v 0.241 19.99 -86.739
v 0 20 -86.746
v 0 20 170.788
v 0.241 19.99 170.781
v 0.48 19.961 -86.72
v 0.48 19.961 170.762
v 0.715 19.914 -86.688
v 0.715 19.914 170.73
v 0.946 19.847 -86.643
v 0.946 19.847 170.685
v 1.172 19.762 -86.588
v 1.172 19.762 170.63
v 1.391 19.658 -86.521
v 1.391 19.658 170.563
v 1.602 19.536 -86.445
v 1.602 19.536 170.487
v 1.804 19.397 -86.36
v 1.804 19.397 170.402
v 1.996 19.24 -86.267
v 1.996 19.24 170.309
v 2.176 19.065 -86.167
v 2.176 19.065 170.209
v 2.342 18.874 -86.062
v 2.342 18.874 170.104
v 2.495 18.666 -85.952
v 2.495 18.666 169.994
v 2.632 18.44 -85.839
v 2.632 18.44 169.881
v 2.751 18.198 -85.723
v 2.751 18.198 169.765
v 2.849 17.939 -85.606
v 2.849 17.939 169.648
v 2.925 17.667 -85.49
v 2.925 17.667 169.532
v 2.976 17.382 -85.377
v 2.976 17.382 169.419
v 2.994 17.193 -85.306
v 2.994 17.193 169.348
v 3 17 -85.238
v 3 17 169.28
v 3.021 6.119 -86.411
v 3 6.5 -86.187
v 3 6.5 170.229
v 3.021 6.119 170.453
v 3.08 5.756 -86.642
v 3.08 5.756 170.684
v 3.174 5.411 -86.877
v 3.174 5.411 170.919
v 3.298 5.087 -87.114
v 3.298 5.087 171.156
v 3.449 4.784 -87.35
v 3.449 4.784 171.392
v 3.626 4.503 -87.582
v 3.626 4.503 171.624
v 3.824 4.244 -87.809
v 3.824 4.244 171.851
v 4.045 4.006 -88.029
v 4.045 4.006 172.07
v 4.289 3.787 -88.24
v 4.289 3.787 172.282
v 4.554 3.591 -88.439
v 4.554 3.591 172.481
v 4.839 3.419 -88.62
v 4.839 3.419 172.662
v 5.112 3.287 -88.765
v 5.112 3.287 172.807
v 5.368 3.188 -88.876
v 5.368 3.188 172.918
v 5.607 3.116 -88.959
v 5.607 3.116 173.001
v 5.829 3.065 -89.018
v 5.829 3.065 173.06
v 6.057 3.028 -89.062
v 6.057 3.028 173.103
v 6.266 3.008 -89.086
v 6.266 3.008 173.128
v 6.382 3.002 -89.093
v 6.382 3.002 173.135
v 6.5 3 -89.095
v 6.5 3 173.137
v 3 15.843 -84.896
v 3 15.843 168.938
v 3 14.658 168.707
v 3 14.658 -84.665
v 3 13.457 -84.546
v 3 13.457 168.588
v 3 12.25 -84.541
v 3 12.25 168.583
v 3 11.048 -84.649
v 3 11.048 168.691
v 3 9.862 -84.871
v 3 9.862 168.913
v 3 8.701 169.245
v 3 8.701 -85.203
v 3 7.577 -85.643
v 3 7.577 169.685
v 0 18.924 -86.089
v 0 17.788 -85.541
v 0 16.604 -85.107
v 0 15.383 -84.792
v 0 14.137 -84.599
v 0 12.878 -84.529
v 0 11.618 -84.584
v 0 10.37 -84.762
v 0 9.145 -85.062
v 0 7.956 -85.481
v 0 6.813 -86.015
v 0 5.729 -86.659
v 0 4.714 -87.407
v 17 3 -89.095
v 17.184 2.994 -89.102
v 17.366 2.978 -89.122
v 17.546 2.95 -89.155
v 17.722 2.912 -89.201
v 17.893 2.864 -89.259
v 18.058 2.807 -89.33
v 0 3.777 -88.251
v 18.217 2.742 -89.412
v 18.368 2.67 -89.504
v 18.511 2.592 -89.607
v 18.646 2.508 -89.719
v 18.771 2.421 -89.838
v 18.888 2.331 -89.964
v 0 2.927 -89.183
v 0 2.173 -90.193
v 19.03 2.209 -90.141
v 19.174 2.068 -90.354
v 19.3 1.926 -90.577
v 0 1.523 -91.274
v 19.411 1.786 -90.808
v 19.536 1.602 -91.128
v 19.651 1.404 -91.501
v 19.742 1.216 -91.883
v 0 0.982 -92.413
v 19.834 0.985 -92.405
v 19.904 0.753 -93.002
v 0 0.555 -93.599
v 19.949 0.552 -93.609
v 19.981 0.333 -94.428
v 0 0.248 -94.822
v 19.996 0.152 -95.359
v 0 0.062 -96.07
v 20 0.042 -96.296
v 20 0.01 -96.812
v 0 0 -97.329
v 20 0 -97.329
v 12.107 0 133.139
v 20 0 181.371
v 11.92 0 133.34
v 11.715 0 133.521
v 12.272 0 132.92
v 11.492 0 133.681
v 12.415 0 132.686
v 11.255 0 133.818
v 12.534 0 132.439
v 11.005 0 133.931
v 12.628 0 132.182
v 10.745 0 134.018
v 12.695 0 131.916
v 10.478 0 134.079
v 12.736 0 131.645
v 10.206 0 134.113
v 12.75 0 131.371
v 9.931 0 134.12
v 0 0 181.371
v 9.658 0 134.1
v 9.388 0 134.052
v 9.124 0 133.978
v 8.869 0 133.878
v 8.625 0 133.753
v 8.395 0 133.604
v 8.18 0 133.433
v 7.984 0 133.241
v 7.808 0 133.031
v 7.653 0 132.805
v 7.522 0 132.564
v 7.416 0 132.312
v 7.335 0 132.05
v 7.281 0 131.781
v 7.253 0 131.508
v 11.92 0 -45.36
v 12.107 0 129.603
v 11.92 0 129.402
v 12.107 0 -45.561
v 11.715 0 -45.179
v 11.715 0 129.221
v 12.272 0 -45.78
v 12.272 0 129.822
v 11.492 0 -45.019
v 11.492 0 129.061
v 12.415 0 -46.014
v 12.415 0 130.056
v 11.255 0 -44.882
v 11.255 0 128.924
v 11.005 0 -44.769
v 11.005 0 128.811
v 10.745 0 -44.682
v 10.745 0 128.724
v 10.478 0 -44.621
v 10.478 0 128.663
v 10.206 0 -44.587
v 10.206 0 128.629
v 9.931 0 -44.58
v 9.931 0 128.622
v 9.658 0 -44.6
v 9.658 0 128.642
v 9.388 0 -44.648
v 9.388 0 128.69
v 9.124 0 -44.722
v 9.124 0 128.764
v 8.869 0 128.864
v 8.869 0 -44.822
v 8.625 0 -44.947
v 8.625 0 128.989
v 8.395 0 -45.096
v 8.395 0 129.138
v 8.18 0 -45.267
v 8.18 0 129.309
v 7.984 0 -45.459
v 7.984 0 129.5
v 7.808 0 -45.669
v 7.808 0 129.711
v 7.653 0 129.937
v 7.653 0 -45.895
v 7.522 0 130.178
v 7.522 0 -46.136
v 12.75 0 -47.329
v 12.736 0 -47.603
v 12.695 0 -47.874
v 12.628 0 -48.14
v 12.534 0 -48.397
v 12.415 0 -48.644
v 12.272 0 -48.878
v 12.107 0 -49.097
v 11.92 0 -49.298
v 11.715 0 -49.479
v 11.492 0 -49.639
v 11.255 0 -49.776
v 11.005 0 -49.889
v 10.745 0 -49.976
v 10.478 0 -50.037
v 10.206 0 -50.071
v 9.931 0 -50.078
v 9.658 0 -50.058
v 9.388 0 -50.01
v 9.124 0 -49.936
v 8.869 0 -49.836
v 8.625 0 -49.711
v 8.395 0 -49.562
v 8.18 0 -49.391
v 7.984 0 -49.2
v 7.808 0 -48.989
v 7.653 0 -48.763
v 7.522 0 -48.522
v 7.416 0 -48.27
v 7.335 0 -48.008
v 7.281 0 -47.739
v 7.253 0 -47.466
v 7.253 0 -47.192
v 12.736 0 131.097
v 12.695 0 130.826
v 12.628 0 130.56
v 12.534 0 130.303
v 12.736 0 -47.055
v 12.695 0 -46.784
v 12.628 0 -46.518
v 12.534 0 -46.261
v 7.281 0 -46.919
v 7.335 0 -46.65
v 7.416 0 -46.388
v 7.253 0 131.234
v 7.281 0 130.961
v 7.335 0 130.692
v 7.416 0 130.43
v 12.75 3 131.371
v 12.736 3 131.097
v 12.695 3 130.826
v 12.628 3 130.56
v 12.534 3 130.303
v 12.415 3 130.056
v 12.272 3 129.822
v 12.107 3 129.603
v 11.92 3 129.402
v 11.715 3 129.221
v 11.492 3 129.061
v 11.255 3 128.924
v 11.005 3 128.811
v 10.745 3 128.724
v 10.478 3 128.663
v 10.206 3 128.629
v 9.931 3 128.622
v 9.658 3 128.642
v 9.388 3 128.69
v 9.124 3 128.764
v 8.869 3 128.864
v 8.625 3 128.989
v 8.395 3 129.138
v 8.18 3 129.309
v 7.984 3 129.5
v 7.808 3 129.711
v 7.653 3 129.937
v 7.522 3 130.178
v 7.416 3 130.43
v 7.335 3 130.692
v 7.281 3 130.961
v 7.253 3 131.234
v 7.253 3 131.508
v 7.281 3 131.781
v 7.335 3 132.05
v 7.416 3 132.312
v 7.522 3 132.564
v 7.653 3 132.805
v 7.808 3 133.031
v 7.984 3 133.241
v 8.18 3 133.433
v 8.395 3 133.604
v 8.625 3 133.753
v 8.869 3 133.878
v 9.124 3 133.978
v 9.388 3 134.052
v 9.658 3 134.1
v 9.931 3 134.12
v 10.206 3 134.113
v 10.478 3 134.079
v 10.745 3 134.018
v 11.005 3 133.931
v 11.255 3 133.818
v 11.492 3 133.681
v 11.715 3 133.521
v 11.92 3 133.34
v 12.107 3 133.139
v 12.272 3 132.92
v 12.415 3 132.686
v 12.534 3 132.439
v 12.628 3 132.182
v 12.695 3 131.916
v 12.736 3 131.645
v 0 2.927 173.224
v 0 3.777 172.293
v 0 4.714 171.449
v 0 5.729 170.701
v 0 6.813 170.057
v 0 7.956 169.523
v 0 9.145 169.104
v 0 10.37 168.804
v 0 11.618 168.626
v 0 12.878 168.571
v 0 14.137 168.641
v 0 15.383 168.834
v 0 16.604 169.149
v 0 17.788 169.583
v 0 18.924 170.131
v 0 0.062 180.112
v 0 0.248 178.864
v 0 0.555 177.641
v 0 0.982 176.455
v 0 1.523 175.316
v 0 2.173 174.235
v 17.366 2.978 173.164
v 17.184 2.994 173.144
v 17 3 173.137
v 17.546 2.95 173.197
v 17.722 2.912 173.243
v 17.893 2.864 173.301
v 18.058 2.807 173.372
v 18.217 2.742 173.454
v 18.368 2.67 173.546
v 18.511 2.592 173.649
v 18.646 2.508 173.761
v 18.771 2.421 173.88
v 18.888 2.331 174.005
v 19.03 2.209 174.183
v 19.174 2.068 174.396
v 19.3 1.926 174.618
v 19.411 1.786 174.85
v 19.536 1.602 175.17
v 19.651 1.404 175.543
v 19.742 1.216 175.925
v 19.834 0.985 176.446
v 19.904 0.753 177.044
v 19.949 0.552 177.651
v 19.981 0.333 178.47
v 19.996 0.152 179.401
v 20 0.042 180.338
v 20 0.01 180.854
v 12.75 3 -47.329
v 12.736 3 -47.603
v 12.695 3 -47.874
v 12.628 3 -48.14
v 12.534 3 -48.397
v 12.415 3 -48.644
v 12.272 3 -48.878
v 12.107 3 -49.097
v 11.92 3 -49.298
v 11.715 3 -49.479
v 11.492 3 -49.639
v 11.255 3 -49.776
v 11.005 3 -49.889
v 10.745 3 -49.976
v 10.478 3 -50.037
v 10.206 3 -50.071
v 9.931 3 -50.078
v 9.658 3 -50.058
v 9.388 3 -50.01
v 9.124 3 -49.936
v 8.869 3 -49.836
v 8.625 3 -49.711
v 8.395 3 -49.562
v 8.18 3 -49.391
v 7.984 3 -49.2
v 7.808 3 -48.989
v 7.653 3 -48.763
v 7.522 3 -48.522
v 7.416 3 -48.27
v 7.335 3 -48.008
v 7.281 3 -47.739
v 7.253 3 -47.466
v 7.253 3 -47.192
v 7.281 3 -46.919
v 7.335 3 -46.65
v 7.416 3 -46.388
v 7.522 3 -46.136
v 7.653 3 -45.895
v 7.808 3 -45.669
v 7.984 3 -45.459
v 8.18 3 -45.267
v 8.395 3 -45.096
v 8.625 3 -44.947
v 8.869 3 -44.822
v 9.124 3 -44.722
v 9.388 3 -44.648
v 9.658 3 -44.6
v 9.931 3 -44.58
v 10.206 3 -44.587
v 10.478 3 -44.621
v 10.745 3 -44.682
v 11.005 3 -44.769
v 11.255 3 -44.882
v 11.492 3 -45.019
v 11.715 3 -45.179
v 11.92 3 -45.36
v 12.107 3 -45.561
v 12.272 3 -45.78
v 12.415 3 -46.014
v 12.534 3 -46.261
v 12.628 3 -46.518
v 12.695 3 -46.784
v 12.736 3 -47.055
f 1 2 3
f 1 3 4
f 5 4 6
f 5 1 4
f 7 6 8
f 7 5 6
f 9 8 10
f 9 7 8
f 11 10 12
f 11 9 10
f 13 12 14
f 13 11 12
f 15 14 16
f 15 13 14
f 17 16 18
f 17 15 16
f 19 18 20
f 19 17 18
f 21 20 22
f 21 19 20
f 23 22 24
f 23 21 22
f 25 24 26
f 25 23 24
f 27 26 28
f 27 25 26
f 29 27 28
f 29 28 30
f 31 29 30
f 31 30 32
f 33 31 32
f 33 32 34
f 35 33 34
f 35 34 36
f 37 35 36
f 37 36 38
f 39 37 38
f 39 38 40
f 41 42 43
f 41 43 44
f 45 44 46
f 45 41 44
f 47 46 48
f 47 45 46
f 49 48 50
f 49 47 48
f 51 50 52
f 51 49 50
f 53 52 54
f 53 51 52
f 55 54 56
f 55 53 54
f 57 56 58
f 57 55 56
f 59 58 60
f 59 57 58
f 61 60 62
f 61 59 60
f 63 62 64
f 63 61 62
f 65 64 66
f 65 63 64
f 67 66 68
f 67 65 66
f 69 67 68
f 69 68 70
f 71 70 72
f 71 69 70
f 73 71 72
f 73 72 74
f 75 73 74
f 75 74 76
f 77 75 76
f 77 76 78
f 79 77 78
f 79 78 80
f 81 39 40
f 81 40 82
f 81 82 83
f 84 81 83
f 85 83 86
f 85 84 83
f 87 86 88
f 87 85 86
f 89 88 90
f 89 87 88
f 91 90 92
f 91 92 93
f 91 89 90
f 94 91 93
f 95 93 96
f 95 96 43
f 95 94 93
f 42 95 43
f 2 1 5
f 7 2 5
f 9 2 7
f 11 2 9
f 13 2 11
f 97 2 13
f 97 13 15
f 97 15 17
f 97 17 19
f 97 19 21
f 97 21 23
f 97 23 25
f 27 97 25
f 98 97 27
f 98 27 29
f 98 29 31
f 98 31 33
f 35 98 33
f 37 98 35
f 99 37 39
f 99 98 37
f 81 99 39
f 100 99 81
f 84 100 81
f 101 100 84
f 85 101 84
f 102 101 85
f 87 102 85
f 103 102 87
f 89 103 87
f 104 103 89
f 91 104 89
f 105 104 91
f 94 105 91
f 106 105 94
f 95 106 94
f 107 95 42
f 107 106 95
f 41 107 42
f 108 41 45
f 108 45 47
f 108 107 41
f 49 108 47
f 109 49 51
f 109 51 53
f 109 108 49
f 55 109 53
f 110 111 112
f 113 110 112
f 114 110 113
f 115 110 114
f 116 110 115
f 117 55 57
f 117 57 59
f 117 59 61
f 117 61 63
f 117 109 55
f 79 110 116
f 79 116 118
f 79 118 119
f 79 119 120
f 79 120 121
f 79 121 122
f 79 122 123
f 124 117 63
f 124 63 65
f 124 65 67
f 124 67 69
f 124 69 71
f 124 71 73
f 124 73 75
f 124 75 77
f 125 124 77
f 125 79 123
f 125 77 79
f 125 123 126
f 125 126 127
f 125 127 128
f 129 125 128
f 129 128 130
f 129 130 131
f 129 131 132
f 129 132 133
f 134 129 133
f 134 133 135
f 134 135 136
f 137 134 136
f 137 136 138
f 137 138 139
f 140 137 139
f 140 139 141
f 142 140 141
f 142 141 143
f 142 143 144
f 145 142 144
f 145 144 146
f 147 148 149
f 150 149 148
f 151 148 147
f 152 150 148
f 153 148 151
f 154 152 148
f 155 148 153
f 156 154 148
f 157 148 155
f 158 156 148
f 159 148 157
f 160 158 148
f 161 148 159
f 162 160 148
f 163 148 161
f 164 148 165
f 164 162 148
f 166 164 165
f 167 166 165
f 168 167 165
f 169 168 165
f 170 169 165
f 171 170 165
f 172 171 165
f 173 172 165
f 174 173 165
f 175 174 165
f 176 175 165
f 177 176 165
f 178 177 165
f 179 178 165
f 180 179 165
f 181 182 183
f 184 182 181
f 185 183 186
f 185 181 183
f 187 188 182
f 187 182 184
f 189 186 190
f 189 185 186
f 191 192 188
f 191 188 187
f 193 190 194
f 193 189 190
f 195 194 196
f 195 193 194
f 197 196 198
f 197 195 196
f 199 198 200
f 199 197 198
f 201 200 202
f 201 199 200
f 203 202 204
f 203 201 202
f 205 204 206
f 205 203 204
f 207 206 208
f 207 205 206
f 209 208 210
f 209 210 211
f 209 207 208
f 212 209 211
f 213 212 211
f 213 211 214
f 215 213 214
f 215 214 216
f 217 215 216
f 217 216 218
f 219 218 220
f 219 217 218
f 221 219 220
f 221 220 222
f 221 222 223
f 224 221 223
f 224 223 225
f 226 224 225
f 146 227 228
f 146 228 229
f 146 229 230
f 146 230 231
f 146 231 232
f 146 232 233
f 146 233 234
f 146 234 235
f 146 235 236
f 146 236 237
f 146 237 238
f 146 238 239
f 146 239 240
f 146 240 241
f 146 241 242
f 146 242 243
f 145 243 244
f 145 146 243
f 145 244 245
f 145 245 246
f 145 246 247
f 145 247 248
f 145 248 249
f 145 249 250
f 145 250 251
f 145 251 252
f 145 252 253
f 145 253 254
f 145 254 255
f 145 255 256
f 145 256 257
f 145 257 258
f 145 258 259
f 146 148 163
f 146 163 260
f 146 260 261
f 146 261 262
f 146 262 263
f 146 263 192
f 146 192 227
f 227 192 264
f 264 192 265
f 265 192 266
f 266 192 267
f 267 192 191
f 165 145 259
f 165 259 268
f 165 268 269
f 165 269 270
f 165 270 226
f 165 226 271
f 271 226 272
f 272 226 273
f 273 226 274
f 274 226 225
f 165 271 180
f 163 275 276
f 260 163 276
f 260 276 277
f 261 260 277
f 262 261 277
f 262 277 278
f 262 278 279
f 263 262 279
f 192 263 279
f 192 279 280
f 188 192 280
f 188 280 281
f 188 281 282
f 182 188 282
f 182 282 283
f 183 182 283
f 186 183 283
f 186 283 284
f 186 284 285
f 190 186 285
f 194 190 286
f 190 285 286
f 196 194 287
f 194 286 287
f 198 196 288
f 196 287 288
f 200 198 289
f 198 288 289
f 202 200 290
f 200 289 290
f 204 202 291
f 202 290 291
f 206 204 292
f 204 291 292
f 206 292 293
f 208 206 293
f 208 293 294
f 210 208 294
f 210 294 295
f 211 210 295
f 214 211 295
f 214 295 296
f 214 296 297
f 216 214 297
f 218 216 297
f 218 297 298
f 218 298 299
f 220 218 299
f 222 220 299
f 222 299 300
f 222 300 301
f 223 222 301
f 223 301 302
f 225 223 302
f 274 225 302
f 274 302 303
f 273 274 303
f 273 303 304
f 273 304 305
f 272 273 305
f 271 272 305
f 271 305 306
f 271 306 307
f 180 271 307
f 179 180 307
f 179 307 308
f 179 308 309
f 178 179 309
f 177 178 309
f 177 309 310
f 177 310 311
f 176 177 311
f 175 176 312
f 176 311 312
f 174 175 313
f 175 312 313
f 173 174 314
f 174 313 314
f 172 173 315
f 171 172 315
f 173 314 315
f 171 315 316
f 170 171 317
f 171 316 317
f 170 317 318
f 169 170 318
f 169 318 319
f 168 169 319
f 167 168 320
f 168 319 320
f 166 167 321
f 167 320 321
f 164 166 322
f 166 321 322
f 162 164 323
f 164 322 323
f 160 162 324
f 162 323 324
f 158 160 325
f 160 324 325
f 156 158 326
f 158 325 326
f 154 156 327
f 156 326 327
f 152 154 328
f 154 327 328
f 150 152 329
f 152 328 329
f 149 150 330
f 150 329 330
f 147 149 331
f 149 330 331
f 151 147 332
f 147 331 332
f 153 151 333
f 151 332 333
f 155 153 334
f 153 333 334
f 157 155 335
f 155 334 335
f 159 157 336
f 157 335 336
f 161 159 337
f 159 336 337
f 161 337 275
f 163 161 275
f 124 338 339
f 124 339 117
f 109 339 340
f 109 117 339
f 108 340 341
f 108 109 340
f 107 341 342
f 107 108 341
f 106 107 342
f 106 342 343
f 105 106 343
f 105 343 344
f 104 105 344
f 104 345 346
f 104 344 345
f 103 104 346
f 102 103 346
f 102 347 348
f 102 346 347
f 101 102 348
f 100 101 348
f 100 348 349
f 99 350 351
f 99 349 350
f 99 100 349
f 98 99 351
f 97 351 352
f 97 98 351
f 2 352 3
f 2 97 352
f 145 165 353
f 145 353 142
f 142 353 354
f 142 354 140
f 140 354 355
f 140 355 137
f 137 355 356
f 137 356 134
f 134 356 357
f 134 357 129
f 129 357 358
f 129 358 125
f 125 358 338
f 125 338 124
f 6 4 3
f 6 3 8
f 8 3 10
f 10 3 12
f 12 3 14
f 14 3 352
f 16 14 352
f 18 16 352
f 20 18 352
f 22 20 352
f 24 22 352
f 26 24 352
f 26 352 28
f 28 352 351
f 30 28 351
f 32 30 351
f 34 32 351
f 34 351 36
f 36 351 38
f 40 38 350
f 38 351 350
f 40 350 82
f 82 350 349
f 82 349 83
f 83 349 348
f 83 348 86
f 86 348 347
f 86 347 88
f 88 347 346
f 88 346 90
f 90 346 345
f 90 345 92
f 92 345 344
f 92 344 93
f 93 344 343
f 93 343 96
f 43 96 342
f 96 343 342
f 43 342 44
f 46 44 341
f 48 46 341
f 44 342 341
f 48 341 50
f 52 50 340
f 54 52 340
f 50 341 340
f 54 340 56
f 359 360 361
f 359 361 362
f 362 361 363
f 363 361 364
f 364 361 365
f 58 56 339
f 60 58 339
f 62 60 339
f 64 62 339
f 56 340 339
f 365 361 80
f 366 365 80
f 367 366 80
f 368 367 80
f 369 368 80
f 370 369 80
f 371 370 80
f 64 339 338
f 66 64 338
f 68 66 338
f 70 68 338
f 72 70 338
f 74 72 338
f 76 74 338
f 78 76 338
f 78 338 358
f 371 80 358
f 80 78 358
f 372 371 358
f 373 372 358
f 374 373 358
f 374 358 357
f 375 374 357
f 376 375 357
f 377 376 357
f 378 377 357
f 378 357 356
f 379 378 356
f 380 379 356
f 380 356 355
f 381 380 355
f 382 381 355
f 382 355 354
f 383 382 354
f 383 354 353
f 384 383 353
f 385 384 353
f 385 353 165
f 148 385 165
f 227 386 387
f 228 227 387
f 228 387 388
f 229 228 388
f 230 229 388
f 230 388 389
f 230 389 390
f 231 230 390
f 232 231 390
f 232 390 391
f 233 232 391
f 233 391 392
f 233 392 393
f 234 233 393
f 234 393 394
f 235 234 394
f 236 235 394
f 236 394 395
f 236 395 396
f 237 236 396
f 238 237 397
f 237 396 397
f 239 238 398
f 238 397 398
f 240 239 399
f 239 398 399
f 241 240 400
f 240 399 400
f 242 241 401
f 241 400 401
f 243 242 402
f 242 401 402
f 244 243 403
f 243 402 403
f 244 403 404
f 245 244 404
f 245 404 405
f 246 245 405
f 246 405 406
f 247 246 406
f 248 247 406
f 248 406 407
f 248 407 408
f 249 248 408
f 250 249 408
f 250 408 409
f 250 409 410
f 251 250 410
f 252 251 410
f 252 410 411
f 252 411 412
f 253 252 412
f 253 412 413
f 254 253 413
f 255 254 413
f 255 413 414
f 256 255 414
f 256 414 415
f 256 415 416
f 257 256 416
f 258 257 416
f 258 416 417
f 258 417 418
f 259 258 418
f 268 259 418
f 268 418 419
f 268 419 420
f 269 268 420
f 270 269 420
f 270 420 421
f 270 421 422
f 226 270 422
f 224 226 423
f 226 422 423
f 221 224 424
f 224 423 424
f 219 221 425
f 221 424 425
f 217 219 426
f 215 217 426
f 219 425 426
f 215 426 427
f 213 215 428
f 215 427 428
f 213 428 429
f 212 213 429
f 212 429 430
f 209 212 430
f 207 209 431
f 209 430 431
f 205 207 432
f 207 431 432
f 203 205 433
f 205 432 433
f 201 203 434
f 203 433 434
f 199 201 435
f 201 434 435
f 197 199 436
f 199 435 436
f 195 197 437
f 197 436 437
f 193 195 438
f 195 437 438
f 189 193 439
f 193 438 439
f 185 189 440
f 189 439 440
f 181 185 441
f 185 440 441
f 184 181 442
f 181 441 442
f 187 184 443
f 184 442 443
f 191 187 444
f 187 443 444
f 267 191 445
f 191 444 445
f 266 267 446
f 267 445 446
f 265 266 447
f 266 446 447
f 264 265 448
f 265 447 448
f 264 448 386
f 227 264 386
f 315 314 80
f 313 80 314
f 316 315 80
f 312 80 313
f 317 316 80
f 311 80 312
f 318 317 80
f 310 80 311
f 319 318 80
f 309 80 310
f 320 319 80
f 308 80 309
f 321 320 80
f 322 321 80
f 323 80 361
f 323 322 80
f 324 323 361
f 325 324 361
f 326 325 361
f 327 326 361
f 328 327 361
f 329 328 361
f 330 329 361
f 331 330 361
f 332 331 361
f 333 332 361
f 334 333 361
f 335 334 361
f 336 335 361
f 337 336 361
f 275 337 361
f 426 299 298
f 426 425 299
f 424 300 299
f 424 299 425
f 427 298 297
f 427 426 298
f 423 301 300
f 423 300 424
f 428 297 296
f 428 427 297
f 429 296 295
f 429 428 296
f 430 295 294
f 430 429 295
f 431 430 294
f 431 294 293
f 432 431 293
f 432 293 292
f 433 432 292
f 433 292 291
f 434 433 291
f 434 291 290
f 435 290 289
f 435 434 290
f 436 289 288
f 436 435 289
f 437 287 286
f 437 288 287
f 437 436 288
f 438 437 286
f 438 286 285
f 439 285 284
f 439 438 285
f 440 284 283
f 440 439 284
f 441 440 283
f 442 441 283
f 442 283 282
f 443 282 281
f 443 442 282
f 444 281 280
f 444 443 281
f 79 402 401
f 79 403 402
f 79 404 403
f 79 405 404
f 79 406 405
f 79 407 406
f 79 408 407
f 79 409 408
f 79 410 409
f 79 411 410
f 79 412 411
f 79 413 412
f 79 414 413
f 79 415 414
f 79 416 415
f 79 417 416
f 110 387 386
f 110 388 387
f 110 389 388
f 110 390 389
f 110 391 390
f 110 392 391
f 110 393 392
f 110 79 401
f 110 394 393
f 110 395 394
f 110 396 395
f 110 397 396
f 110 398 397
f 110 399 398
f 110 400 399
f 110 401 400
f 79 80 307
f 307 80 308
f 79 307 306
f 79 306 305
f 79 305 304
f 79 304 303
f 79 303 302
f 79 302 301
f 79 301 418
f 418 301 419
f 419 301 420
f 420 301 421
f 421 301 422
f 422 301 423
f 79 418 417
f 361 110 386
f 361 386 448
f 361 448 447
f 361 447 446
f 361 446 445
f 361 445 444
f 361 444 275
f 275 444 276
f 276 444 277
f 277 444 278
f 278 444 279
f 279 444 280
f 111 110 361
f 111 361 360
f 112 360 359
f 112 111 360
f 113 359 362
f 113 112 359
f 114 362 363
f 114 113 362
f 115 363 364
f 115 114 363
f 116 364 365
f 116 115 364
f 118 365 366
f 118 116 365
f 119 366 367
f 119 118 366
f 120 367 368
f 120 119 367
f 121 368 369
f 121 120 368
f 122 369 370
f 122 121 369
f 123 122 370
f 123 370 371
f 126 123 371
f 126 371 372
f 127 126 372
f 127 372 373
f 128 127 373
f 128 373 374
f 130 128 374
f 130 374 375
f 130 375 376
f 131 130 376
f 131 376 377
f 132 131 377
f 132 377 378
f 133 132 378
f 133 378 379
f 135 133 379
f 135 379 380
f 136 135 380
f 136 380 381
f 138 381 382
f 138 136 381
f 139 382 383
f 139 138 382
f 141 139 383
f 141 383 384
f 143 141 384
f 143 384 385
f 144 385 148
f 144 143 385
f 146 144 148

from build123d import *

# Parameters (mm, degrees)
MIEMBRO_ESTRUCTURAL1_DEPTH   = 278.7
CORTAR_EXTRUIR2_DEPTH        = 184.563144285
TALADRO_DE_MARGEN_PARA_M51_D = 5.5


with BuildPart() as part:
    # Sketch1 → Miembro estructural1 (new body)
    with BuildSketch(Plane.XY.offset(-97.329032258)):
        with BuildLine():
            Line((0, 0), (0, 20))
            ThreePointArc((0, 20), (2.121320344, 19.121320344), (3, 17))
            Line((3, 17), (3, 6.5))
            ThreePointArc((3, 6.5), (4.025126266, 4.025126266), (6.5, 3))
            Line((6.5, 3), (17, 3))
            ThreePointArc((17, 3), (19.121320344, 2.121320344), (20, 0))
            Line((20, 0), (0, 0))
        make_face()
    extrude(amount=MIEMBRO_ESTRUCTURAL1_DEPTH)

    # Croquis2 → Cortar-Extruir2 (cut, through all)
    with BuildSketch(Plane.YZ):
        with BuildLine():
            Line((0, -97.329032258), (0, -196.975216041))
            Line((0, -196.975216041), (22.851984592, -196.975216041))
            Line((22.851984592, -196.975216041), (22.851984592, -180.447153459))
            Line((22.851984592, -180.447153459), (12.695152183, -110.128602834))
            ThreePointArc((12.695152183, -110.128602834), (21.887960499, -88.315210983), (0, -97.329032258))
        make_face()
        with BuildLine():
            Line((22.851984592, 264.489088943), (12.695152183, 194.170538318))
            ThreePointArc((12.695152183, 194.170538318), (21.887960499, 172.357146467), (0, 181.370967742))
            Line((0, 181.370967742), (0, 281.017151525))
            Line((0, 281.017151525), (22.851984592, 281.017151525))
            Line((22.851984592, 281.017151525), (22.851984592, 264.489088943))
        make_face()
    extrude(amount=CORTAR_EXTRUIR2_DEPTH, mode=Mode.SUBTRACT)

    # Taladro de margen para M51 (through all)
    with Locations(Plane(origin=(0, 0, 0), x_dir=(-1, 0, 0), z_dir=(0, -1, 0))):
        with Locations((-10, -131.370967742), (-10, 47.329032258)):
            Hole(TALADRO_DE_MARGEN_PARA_M51_D / 2)


solid = part.part
